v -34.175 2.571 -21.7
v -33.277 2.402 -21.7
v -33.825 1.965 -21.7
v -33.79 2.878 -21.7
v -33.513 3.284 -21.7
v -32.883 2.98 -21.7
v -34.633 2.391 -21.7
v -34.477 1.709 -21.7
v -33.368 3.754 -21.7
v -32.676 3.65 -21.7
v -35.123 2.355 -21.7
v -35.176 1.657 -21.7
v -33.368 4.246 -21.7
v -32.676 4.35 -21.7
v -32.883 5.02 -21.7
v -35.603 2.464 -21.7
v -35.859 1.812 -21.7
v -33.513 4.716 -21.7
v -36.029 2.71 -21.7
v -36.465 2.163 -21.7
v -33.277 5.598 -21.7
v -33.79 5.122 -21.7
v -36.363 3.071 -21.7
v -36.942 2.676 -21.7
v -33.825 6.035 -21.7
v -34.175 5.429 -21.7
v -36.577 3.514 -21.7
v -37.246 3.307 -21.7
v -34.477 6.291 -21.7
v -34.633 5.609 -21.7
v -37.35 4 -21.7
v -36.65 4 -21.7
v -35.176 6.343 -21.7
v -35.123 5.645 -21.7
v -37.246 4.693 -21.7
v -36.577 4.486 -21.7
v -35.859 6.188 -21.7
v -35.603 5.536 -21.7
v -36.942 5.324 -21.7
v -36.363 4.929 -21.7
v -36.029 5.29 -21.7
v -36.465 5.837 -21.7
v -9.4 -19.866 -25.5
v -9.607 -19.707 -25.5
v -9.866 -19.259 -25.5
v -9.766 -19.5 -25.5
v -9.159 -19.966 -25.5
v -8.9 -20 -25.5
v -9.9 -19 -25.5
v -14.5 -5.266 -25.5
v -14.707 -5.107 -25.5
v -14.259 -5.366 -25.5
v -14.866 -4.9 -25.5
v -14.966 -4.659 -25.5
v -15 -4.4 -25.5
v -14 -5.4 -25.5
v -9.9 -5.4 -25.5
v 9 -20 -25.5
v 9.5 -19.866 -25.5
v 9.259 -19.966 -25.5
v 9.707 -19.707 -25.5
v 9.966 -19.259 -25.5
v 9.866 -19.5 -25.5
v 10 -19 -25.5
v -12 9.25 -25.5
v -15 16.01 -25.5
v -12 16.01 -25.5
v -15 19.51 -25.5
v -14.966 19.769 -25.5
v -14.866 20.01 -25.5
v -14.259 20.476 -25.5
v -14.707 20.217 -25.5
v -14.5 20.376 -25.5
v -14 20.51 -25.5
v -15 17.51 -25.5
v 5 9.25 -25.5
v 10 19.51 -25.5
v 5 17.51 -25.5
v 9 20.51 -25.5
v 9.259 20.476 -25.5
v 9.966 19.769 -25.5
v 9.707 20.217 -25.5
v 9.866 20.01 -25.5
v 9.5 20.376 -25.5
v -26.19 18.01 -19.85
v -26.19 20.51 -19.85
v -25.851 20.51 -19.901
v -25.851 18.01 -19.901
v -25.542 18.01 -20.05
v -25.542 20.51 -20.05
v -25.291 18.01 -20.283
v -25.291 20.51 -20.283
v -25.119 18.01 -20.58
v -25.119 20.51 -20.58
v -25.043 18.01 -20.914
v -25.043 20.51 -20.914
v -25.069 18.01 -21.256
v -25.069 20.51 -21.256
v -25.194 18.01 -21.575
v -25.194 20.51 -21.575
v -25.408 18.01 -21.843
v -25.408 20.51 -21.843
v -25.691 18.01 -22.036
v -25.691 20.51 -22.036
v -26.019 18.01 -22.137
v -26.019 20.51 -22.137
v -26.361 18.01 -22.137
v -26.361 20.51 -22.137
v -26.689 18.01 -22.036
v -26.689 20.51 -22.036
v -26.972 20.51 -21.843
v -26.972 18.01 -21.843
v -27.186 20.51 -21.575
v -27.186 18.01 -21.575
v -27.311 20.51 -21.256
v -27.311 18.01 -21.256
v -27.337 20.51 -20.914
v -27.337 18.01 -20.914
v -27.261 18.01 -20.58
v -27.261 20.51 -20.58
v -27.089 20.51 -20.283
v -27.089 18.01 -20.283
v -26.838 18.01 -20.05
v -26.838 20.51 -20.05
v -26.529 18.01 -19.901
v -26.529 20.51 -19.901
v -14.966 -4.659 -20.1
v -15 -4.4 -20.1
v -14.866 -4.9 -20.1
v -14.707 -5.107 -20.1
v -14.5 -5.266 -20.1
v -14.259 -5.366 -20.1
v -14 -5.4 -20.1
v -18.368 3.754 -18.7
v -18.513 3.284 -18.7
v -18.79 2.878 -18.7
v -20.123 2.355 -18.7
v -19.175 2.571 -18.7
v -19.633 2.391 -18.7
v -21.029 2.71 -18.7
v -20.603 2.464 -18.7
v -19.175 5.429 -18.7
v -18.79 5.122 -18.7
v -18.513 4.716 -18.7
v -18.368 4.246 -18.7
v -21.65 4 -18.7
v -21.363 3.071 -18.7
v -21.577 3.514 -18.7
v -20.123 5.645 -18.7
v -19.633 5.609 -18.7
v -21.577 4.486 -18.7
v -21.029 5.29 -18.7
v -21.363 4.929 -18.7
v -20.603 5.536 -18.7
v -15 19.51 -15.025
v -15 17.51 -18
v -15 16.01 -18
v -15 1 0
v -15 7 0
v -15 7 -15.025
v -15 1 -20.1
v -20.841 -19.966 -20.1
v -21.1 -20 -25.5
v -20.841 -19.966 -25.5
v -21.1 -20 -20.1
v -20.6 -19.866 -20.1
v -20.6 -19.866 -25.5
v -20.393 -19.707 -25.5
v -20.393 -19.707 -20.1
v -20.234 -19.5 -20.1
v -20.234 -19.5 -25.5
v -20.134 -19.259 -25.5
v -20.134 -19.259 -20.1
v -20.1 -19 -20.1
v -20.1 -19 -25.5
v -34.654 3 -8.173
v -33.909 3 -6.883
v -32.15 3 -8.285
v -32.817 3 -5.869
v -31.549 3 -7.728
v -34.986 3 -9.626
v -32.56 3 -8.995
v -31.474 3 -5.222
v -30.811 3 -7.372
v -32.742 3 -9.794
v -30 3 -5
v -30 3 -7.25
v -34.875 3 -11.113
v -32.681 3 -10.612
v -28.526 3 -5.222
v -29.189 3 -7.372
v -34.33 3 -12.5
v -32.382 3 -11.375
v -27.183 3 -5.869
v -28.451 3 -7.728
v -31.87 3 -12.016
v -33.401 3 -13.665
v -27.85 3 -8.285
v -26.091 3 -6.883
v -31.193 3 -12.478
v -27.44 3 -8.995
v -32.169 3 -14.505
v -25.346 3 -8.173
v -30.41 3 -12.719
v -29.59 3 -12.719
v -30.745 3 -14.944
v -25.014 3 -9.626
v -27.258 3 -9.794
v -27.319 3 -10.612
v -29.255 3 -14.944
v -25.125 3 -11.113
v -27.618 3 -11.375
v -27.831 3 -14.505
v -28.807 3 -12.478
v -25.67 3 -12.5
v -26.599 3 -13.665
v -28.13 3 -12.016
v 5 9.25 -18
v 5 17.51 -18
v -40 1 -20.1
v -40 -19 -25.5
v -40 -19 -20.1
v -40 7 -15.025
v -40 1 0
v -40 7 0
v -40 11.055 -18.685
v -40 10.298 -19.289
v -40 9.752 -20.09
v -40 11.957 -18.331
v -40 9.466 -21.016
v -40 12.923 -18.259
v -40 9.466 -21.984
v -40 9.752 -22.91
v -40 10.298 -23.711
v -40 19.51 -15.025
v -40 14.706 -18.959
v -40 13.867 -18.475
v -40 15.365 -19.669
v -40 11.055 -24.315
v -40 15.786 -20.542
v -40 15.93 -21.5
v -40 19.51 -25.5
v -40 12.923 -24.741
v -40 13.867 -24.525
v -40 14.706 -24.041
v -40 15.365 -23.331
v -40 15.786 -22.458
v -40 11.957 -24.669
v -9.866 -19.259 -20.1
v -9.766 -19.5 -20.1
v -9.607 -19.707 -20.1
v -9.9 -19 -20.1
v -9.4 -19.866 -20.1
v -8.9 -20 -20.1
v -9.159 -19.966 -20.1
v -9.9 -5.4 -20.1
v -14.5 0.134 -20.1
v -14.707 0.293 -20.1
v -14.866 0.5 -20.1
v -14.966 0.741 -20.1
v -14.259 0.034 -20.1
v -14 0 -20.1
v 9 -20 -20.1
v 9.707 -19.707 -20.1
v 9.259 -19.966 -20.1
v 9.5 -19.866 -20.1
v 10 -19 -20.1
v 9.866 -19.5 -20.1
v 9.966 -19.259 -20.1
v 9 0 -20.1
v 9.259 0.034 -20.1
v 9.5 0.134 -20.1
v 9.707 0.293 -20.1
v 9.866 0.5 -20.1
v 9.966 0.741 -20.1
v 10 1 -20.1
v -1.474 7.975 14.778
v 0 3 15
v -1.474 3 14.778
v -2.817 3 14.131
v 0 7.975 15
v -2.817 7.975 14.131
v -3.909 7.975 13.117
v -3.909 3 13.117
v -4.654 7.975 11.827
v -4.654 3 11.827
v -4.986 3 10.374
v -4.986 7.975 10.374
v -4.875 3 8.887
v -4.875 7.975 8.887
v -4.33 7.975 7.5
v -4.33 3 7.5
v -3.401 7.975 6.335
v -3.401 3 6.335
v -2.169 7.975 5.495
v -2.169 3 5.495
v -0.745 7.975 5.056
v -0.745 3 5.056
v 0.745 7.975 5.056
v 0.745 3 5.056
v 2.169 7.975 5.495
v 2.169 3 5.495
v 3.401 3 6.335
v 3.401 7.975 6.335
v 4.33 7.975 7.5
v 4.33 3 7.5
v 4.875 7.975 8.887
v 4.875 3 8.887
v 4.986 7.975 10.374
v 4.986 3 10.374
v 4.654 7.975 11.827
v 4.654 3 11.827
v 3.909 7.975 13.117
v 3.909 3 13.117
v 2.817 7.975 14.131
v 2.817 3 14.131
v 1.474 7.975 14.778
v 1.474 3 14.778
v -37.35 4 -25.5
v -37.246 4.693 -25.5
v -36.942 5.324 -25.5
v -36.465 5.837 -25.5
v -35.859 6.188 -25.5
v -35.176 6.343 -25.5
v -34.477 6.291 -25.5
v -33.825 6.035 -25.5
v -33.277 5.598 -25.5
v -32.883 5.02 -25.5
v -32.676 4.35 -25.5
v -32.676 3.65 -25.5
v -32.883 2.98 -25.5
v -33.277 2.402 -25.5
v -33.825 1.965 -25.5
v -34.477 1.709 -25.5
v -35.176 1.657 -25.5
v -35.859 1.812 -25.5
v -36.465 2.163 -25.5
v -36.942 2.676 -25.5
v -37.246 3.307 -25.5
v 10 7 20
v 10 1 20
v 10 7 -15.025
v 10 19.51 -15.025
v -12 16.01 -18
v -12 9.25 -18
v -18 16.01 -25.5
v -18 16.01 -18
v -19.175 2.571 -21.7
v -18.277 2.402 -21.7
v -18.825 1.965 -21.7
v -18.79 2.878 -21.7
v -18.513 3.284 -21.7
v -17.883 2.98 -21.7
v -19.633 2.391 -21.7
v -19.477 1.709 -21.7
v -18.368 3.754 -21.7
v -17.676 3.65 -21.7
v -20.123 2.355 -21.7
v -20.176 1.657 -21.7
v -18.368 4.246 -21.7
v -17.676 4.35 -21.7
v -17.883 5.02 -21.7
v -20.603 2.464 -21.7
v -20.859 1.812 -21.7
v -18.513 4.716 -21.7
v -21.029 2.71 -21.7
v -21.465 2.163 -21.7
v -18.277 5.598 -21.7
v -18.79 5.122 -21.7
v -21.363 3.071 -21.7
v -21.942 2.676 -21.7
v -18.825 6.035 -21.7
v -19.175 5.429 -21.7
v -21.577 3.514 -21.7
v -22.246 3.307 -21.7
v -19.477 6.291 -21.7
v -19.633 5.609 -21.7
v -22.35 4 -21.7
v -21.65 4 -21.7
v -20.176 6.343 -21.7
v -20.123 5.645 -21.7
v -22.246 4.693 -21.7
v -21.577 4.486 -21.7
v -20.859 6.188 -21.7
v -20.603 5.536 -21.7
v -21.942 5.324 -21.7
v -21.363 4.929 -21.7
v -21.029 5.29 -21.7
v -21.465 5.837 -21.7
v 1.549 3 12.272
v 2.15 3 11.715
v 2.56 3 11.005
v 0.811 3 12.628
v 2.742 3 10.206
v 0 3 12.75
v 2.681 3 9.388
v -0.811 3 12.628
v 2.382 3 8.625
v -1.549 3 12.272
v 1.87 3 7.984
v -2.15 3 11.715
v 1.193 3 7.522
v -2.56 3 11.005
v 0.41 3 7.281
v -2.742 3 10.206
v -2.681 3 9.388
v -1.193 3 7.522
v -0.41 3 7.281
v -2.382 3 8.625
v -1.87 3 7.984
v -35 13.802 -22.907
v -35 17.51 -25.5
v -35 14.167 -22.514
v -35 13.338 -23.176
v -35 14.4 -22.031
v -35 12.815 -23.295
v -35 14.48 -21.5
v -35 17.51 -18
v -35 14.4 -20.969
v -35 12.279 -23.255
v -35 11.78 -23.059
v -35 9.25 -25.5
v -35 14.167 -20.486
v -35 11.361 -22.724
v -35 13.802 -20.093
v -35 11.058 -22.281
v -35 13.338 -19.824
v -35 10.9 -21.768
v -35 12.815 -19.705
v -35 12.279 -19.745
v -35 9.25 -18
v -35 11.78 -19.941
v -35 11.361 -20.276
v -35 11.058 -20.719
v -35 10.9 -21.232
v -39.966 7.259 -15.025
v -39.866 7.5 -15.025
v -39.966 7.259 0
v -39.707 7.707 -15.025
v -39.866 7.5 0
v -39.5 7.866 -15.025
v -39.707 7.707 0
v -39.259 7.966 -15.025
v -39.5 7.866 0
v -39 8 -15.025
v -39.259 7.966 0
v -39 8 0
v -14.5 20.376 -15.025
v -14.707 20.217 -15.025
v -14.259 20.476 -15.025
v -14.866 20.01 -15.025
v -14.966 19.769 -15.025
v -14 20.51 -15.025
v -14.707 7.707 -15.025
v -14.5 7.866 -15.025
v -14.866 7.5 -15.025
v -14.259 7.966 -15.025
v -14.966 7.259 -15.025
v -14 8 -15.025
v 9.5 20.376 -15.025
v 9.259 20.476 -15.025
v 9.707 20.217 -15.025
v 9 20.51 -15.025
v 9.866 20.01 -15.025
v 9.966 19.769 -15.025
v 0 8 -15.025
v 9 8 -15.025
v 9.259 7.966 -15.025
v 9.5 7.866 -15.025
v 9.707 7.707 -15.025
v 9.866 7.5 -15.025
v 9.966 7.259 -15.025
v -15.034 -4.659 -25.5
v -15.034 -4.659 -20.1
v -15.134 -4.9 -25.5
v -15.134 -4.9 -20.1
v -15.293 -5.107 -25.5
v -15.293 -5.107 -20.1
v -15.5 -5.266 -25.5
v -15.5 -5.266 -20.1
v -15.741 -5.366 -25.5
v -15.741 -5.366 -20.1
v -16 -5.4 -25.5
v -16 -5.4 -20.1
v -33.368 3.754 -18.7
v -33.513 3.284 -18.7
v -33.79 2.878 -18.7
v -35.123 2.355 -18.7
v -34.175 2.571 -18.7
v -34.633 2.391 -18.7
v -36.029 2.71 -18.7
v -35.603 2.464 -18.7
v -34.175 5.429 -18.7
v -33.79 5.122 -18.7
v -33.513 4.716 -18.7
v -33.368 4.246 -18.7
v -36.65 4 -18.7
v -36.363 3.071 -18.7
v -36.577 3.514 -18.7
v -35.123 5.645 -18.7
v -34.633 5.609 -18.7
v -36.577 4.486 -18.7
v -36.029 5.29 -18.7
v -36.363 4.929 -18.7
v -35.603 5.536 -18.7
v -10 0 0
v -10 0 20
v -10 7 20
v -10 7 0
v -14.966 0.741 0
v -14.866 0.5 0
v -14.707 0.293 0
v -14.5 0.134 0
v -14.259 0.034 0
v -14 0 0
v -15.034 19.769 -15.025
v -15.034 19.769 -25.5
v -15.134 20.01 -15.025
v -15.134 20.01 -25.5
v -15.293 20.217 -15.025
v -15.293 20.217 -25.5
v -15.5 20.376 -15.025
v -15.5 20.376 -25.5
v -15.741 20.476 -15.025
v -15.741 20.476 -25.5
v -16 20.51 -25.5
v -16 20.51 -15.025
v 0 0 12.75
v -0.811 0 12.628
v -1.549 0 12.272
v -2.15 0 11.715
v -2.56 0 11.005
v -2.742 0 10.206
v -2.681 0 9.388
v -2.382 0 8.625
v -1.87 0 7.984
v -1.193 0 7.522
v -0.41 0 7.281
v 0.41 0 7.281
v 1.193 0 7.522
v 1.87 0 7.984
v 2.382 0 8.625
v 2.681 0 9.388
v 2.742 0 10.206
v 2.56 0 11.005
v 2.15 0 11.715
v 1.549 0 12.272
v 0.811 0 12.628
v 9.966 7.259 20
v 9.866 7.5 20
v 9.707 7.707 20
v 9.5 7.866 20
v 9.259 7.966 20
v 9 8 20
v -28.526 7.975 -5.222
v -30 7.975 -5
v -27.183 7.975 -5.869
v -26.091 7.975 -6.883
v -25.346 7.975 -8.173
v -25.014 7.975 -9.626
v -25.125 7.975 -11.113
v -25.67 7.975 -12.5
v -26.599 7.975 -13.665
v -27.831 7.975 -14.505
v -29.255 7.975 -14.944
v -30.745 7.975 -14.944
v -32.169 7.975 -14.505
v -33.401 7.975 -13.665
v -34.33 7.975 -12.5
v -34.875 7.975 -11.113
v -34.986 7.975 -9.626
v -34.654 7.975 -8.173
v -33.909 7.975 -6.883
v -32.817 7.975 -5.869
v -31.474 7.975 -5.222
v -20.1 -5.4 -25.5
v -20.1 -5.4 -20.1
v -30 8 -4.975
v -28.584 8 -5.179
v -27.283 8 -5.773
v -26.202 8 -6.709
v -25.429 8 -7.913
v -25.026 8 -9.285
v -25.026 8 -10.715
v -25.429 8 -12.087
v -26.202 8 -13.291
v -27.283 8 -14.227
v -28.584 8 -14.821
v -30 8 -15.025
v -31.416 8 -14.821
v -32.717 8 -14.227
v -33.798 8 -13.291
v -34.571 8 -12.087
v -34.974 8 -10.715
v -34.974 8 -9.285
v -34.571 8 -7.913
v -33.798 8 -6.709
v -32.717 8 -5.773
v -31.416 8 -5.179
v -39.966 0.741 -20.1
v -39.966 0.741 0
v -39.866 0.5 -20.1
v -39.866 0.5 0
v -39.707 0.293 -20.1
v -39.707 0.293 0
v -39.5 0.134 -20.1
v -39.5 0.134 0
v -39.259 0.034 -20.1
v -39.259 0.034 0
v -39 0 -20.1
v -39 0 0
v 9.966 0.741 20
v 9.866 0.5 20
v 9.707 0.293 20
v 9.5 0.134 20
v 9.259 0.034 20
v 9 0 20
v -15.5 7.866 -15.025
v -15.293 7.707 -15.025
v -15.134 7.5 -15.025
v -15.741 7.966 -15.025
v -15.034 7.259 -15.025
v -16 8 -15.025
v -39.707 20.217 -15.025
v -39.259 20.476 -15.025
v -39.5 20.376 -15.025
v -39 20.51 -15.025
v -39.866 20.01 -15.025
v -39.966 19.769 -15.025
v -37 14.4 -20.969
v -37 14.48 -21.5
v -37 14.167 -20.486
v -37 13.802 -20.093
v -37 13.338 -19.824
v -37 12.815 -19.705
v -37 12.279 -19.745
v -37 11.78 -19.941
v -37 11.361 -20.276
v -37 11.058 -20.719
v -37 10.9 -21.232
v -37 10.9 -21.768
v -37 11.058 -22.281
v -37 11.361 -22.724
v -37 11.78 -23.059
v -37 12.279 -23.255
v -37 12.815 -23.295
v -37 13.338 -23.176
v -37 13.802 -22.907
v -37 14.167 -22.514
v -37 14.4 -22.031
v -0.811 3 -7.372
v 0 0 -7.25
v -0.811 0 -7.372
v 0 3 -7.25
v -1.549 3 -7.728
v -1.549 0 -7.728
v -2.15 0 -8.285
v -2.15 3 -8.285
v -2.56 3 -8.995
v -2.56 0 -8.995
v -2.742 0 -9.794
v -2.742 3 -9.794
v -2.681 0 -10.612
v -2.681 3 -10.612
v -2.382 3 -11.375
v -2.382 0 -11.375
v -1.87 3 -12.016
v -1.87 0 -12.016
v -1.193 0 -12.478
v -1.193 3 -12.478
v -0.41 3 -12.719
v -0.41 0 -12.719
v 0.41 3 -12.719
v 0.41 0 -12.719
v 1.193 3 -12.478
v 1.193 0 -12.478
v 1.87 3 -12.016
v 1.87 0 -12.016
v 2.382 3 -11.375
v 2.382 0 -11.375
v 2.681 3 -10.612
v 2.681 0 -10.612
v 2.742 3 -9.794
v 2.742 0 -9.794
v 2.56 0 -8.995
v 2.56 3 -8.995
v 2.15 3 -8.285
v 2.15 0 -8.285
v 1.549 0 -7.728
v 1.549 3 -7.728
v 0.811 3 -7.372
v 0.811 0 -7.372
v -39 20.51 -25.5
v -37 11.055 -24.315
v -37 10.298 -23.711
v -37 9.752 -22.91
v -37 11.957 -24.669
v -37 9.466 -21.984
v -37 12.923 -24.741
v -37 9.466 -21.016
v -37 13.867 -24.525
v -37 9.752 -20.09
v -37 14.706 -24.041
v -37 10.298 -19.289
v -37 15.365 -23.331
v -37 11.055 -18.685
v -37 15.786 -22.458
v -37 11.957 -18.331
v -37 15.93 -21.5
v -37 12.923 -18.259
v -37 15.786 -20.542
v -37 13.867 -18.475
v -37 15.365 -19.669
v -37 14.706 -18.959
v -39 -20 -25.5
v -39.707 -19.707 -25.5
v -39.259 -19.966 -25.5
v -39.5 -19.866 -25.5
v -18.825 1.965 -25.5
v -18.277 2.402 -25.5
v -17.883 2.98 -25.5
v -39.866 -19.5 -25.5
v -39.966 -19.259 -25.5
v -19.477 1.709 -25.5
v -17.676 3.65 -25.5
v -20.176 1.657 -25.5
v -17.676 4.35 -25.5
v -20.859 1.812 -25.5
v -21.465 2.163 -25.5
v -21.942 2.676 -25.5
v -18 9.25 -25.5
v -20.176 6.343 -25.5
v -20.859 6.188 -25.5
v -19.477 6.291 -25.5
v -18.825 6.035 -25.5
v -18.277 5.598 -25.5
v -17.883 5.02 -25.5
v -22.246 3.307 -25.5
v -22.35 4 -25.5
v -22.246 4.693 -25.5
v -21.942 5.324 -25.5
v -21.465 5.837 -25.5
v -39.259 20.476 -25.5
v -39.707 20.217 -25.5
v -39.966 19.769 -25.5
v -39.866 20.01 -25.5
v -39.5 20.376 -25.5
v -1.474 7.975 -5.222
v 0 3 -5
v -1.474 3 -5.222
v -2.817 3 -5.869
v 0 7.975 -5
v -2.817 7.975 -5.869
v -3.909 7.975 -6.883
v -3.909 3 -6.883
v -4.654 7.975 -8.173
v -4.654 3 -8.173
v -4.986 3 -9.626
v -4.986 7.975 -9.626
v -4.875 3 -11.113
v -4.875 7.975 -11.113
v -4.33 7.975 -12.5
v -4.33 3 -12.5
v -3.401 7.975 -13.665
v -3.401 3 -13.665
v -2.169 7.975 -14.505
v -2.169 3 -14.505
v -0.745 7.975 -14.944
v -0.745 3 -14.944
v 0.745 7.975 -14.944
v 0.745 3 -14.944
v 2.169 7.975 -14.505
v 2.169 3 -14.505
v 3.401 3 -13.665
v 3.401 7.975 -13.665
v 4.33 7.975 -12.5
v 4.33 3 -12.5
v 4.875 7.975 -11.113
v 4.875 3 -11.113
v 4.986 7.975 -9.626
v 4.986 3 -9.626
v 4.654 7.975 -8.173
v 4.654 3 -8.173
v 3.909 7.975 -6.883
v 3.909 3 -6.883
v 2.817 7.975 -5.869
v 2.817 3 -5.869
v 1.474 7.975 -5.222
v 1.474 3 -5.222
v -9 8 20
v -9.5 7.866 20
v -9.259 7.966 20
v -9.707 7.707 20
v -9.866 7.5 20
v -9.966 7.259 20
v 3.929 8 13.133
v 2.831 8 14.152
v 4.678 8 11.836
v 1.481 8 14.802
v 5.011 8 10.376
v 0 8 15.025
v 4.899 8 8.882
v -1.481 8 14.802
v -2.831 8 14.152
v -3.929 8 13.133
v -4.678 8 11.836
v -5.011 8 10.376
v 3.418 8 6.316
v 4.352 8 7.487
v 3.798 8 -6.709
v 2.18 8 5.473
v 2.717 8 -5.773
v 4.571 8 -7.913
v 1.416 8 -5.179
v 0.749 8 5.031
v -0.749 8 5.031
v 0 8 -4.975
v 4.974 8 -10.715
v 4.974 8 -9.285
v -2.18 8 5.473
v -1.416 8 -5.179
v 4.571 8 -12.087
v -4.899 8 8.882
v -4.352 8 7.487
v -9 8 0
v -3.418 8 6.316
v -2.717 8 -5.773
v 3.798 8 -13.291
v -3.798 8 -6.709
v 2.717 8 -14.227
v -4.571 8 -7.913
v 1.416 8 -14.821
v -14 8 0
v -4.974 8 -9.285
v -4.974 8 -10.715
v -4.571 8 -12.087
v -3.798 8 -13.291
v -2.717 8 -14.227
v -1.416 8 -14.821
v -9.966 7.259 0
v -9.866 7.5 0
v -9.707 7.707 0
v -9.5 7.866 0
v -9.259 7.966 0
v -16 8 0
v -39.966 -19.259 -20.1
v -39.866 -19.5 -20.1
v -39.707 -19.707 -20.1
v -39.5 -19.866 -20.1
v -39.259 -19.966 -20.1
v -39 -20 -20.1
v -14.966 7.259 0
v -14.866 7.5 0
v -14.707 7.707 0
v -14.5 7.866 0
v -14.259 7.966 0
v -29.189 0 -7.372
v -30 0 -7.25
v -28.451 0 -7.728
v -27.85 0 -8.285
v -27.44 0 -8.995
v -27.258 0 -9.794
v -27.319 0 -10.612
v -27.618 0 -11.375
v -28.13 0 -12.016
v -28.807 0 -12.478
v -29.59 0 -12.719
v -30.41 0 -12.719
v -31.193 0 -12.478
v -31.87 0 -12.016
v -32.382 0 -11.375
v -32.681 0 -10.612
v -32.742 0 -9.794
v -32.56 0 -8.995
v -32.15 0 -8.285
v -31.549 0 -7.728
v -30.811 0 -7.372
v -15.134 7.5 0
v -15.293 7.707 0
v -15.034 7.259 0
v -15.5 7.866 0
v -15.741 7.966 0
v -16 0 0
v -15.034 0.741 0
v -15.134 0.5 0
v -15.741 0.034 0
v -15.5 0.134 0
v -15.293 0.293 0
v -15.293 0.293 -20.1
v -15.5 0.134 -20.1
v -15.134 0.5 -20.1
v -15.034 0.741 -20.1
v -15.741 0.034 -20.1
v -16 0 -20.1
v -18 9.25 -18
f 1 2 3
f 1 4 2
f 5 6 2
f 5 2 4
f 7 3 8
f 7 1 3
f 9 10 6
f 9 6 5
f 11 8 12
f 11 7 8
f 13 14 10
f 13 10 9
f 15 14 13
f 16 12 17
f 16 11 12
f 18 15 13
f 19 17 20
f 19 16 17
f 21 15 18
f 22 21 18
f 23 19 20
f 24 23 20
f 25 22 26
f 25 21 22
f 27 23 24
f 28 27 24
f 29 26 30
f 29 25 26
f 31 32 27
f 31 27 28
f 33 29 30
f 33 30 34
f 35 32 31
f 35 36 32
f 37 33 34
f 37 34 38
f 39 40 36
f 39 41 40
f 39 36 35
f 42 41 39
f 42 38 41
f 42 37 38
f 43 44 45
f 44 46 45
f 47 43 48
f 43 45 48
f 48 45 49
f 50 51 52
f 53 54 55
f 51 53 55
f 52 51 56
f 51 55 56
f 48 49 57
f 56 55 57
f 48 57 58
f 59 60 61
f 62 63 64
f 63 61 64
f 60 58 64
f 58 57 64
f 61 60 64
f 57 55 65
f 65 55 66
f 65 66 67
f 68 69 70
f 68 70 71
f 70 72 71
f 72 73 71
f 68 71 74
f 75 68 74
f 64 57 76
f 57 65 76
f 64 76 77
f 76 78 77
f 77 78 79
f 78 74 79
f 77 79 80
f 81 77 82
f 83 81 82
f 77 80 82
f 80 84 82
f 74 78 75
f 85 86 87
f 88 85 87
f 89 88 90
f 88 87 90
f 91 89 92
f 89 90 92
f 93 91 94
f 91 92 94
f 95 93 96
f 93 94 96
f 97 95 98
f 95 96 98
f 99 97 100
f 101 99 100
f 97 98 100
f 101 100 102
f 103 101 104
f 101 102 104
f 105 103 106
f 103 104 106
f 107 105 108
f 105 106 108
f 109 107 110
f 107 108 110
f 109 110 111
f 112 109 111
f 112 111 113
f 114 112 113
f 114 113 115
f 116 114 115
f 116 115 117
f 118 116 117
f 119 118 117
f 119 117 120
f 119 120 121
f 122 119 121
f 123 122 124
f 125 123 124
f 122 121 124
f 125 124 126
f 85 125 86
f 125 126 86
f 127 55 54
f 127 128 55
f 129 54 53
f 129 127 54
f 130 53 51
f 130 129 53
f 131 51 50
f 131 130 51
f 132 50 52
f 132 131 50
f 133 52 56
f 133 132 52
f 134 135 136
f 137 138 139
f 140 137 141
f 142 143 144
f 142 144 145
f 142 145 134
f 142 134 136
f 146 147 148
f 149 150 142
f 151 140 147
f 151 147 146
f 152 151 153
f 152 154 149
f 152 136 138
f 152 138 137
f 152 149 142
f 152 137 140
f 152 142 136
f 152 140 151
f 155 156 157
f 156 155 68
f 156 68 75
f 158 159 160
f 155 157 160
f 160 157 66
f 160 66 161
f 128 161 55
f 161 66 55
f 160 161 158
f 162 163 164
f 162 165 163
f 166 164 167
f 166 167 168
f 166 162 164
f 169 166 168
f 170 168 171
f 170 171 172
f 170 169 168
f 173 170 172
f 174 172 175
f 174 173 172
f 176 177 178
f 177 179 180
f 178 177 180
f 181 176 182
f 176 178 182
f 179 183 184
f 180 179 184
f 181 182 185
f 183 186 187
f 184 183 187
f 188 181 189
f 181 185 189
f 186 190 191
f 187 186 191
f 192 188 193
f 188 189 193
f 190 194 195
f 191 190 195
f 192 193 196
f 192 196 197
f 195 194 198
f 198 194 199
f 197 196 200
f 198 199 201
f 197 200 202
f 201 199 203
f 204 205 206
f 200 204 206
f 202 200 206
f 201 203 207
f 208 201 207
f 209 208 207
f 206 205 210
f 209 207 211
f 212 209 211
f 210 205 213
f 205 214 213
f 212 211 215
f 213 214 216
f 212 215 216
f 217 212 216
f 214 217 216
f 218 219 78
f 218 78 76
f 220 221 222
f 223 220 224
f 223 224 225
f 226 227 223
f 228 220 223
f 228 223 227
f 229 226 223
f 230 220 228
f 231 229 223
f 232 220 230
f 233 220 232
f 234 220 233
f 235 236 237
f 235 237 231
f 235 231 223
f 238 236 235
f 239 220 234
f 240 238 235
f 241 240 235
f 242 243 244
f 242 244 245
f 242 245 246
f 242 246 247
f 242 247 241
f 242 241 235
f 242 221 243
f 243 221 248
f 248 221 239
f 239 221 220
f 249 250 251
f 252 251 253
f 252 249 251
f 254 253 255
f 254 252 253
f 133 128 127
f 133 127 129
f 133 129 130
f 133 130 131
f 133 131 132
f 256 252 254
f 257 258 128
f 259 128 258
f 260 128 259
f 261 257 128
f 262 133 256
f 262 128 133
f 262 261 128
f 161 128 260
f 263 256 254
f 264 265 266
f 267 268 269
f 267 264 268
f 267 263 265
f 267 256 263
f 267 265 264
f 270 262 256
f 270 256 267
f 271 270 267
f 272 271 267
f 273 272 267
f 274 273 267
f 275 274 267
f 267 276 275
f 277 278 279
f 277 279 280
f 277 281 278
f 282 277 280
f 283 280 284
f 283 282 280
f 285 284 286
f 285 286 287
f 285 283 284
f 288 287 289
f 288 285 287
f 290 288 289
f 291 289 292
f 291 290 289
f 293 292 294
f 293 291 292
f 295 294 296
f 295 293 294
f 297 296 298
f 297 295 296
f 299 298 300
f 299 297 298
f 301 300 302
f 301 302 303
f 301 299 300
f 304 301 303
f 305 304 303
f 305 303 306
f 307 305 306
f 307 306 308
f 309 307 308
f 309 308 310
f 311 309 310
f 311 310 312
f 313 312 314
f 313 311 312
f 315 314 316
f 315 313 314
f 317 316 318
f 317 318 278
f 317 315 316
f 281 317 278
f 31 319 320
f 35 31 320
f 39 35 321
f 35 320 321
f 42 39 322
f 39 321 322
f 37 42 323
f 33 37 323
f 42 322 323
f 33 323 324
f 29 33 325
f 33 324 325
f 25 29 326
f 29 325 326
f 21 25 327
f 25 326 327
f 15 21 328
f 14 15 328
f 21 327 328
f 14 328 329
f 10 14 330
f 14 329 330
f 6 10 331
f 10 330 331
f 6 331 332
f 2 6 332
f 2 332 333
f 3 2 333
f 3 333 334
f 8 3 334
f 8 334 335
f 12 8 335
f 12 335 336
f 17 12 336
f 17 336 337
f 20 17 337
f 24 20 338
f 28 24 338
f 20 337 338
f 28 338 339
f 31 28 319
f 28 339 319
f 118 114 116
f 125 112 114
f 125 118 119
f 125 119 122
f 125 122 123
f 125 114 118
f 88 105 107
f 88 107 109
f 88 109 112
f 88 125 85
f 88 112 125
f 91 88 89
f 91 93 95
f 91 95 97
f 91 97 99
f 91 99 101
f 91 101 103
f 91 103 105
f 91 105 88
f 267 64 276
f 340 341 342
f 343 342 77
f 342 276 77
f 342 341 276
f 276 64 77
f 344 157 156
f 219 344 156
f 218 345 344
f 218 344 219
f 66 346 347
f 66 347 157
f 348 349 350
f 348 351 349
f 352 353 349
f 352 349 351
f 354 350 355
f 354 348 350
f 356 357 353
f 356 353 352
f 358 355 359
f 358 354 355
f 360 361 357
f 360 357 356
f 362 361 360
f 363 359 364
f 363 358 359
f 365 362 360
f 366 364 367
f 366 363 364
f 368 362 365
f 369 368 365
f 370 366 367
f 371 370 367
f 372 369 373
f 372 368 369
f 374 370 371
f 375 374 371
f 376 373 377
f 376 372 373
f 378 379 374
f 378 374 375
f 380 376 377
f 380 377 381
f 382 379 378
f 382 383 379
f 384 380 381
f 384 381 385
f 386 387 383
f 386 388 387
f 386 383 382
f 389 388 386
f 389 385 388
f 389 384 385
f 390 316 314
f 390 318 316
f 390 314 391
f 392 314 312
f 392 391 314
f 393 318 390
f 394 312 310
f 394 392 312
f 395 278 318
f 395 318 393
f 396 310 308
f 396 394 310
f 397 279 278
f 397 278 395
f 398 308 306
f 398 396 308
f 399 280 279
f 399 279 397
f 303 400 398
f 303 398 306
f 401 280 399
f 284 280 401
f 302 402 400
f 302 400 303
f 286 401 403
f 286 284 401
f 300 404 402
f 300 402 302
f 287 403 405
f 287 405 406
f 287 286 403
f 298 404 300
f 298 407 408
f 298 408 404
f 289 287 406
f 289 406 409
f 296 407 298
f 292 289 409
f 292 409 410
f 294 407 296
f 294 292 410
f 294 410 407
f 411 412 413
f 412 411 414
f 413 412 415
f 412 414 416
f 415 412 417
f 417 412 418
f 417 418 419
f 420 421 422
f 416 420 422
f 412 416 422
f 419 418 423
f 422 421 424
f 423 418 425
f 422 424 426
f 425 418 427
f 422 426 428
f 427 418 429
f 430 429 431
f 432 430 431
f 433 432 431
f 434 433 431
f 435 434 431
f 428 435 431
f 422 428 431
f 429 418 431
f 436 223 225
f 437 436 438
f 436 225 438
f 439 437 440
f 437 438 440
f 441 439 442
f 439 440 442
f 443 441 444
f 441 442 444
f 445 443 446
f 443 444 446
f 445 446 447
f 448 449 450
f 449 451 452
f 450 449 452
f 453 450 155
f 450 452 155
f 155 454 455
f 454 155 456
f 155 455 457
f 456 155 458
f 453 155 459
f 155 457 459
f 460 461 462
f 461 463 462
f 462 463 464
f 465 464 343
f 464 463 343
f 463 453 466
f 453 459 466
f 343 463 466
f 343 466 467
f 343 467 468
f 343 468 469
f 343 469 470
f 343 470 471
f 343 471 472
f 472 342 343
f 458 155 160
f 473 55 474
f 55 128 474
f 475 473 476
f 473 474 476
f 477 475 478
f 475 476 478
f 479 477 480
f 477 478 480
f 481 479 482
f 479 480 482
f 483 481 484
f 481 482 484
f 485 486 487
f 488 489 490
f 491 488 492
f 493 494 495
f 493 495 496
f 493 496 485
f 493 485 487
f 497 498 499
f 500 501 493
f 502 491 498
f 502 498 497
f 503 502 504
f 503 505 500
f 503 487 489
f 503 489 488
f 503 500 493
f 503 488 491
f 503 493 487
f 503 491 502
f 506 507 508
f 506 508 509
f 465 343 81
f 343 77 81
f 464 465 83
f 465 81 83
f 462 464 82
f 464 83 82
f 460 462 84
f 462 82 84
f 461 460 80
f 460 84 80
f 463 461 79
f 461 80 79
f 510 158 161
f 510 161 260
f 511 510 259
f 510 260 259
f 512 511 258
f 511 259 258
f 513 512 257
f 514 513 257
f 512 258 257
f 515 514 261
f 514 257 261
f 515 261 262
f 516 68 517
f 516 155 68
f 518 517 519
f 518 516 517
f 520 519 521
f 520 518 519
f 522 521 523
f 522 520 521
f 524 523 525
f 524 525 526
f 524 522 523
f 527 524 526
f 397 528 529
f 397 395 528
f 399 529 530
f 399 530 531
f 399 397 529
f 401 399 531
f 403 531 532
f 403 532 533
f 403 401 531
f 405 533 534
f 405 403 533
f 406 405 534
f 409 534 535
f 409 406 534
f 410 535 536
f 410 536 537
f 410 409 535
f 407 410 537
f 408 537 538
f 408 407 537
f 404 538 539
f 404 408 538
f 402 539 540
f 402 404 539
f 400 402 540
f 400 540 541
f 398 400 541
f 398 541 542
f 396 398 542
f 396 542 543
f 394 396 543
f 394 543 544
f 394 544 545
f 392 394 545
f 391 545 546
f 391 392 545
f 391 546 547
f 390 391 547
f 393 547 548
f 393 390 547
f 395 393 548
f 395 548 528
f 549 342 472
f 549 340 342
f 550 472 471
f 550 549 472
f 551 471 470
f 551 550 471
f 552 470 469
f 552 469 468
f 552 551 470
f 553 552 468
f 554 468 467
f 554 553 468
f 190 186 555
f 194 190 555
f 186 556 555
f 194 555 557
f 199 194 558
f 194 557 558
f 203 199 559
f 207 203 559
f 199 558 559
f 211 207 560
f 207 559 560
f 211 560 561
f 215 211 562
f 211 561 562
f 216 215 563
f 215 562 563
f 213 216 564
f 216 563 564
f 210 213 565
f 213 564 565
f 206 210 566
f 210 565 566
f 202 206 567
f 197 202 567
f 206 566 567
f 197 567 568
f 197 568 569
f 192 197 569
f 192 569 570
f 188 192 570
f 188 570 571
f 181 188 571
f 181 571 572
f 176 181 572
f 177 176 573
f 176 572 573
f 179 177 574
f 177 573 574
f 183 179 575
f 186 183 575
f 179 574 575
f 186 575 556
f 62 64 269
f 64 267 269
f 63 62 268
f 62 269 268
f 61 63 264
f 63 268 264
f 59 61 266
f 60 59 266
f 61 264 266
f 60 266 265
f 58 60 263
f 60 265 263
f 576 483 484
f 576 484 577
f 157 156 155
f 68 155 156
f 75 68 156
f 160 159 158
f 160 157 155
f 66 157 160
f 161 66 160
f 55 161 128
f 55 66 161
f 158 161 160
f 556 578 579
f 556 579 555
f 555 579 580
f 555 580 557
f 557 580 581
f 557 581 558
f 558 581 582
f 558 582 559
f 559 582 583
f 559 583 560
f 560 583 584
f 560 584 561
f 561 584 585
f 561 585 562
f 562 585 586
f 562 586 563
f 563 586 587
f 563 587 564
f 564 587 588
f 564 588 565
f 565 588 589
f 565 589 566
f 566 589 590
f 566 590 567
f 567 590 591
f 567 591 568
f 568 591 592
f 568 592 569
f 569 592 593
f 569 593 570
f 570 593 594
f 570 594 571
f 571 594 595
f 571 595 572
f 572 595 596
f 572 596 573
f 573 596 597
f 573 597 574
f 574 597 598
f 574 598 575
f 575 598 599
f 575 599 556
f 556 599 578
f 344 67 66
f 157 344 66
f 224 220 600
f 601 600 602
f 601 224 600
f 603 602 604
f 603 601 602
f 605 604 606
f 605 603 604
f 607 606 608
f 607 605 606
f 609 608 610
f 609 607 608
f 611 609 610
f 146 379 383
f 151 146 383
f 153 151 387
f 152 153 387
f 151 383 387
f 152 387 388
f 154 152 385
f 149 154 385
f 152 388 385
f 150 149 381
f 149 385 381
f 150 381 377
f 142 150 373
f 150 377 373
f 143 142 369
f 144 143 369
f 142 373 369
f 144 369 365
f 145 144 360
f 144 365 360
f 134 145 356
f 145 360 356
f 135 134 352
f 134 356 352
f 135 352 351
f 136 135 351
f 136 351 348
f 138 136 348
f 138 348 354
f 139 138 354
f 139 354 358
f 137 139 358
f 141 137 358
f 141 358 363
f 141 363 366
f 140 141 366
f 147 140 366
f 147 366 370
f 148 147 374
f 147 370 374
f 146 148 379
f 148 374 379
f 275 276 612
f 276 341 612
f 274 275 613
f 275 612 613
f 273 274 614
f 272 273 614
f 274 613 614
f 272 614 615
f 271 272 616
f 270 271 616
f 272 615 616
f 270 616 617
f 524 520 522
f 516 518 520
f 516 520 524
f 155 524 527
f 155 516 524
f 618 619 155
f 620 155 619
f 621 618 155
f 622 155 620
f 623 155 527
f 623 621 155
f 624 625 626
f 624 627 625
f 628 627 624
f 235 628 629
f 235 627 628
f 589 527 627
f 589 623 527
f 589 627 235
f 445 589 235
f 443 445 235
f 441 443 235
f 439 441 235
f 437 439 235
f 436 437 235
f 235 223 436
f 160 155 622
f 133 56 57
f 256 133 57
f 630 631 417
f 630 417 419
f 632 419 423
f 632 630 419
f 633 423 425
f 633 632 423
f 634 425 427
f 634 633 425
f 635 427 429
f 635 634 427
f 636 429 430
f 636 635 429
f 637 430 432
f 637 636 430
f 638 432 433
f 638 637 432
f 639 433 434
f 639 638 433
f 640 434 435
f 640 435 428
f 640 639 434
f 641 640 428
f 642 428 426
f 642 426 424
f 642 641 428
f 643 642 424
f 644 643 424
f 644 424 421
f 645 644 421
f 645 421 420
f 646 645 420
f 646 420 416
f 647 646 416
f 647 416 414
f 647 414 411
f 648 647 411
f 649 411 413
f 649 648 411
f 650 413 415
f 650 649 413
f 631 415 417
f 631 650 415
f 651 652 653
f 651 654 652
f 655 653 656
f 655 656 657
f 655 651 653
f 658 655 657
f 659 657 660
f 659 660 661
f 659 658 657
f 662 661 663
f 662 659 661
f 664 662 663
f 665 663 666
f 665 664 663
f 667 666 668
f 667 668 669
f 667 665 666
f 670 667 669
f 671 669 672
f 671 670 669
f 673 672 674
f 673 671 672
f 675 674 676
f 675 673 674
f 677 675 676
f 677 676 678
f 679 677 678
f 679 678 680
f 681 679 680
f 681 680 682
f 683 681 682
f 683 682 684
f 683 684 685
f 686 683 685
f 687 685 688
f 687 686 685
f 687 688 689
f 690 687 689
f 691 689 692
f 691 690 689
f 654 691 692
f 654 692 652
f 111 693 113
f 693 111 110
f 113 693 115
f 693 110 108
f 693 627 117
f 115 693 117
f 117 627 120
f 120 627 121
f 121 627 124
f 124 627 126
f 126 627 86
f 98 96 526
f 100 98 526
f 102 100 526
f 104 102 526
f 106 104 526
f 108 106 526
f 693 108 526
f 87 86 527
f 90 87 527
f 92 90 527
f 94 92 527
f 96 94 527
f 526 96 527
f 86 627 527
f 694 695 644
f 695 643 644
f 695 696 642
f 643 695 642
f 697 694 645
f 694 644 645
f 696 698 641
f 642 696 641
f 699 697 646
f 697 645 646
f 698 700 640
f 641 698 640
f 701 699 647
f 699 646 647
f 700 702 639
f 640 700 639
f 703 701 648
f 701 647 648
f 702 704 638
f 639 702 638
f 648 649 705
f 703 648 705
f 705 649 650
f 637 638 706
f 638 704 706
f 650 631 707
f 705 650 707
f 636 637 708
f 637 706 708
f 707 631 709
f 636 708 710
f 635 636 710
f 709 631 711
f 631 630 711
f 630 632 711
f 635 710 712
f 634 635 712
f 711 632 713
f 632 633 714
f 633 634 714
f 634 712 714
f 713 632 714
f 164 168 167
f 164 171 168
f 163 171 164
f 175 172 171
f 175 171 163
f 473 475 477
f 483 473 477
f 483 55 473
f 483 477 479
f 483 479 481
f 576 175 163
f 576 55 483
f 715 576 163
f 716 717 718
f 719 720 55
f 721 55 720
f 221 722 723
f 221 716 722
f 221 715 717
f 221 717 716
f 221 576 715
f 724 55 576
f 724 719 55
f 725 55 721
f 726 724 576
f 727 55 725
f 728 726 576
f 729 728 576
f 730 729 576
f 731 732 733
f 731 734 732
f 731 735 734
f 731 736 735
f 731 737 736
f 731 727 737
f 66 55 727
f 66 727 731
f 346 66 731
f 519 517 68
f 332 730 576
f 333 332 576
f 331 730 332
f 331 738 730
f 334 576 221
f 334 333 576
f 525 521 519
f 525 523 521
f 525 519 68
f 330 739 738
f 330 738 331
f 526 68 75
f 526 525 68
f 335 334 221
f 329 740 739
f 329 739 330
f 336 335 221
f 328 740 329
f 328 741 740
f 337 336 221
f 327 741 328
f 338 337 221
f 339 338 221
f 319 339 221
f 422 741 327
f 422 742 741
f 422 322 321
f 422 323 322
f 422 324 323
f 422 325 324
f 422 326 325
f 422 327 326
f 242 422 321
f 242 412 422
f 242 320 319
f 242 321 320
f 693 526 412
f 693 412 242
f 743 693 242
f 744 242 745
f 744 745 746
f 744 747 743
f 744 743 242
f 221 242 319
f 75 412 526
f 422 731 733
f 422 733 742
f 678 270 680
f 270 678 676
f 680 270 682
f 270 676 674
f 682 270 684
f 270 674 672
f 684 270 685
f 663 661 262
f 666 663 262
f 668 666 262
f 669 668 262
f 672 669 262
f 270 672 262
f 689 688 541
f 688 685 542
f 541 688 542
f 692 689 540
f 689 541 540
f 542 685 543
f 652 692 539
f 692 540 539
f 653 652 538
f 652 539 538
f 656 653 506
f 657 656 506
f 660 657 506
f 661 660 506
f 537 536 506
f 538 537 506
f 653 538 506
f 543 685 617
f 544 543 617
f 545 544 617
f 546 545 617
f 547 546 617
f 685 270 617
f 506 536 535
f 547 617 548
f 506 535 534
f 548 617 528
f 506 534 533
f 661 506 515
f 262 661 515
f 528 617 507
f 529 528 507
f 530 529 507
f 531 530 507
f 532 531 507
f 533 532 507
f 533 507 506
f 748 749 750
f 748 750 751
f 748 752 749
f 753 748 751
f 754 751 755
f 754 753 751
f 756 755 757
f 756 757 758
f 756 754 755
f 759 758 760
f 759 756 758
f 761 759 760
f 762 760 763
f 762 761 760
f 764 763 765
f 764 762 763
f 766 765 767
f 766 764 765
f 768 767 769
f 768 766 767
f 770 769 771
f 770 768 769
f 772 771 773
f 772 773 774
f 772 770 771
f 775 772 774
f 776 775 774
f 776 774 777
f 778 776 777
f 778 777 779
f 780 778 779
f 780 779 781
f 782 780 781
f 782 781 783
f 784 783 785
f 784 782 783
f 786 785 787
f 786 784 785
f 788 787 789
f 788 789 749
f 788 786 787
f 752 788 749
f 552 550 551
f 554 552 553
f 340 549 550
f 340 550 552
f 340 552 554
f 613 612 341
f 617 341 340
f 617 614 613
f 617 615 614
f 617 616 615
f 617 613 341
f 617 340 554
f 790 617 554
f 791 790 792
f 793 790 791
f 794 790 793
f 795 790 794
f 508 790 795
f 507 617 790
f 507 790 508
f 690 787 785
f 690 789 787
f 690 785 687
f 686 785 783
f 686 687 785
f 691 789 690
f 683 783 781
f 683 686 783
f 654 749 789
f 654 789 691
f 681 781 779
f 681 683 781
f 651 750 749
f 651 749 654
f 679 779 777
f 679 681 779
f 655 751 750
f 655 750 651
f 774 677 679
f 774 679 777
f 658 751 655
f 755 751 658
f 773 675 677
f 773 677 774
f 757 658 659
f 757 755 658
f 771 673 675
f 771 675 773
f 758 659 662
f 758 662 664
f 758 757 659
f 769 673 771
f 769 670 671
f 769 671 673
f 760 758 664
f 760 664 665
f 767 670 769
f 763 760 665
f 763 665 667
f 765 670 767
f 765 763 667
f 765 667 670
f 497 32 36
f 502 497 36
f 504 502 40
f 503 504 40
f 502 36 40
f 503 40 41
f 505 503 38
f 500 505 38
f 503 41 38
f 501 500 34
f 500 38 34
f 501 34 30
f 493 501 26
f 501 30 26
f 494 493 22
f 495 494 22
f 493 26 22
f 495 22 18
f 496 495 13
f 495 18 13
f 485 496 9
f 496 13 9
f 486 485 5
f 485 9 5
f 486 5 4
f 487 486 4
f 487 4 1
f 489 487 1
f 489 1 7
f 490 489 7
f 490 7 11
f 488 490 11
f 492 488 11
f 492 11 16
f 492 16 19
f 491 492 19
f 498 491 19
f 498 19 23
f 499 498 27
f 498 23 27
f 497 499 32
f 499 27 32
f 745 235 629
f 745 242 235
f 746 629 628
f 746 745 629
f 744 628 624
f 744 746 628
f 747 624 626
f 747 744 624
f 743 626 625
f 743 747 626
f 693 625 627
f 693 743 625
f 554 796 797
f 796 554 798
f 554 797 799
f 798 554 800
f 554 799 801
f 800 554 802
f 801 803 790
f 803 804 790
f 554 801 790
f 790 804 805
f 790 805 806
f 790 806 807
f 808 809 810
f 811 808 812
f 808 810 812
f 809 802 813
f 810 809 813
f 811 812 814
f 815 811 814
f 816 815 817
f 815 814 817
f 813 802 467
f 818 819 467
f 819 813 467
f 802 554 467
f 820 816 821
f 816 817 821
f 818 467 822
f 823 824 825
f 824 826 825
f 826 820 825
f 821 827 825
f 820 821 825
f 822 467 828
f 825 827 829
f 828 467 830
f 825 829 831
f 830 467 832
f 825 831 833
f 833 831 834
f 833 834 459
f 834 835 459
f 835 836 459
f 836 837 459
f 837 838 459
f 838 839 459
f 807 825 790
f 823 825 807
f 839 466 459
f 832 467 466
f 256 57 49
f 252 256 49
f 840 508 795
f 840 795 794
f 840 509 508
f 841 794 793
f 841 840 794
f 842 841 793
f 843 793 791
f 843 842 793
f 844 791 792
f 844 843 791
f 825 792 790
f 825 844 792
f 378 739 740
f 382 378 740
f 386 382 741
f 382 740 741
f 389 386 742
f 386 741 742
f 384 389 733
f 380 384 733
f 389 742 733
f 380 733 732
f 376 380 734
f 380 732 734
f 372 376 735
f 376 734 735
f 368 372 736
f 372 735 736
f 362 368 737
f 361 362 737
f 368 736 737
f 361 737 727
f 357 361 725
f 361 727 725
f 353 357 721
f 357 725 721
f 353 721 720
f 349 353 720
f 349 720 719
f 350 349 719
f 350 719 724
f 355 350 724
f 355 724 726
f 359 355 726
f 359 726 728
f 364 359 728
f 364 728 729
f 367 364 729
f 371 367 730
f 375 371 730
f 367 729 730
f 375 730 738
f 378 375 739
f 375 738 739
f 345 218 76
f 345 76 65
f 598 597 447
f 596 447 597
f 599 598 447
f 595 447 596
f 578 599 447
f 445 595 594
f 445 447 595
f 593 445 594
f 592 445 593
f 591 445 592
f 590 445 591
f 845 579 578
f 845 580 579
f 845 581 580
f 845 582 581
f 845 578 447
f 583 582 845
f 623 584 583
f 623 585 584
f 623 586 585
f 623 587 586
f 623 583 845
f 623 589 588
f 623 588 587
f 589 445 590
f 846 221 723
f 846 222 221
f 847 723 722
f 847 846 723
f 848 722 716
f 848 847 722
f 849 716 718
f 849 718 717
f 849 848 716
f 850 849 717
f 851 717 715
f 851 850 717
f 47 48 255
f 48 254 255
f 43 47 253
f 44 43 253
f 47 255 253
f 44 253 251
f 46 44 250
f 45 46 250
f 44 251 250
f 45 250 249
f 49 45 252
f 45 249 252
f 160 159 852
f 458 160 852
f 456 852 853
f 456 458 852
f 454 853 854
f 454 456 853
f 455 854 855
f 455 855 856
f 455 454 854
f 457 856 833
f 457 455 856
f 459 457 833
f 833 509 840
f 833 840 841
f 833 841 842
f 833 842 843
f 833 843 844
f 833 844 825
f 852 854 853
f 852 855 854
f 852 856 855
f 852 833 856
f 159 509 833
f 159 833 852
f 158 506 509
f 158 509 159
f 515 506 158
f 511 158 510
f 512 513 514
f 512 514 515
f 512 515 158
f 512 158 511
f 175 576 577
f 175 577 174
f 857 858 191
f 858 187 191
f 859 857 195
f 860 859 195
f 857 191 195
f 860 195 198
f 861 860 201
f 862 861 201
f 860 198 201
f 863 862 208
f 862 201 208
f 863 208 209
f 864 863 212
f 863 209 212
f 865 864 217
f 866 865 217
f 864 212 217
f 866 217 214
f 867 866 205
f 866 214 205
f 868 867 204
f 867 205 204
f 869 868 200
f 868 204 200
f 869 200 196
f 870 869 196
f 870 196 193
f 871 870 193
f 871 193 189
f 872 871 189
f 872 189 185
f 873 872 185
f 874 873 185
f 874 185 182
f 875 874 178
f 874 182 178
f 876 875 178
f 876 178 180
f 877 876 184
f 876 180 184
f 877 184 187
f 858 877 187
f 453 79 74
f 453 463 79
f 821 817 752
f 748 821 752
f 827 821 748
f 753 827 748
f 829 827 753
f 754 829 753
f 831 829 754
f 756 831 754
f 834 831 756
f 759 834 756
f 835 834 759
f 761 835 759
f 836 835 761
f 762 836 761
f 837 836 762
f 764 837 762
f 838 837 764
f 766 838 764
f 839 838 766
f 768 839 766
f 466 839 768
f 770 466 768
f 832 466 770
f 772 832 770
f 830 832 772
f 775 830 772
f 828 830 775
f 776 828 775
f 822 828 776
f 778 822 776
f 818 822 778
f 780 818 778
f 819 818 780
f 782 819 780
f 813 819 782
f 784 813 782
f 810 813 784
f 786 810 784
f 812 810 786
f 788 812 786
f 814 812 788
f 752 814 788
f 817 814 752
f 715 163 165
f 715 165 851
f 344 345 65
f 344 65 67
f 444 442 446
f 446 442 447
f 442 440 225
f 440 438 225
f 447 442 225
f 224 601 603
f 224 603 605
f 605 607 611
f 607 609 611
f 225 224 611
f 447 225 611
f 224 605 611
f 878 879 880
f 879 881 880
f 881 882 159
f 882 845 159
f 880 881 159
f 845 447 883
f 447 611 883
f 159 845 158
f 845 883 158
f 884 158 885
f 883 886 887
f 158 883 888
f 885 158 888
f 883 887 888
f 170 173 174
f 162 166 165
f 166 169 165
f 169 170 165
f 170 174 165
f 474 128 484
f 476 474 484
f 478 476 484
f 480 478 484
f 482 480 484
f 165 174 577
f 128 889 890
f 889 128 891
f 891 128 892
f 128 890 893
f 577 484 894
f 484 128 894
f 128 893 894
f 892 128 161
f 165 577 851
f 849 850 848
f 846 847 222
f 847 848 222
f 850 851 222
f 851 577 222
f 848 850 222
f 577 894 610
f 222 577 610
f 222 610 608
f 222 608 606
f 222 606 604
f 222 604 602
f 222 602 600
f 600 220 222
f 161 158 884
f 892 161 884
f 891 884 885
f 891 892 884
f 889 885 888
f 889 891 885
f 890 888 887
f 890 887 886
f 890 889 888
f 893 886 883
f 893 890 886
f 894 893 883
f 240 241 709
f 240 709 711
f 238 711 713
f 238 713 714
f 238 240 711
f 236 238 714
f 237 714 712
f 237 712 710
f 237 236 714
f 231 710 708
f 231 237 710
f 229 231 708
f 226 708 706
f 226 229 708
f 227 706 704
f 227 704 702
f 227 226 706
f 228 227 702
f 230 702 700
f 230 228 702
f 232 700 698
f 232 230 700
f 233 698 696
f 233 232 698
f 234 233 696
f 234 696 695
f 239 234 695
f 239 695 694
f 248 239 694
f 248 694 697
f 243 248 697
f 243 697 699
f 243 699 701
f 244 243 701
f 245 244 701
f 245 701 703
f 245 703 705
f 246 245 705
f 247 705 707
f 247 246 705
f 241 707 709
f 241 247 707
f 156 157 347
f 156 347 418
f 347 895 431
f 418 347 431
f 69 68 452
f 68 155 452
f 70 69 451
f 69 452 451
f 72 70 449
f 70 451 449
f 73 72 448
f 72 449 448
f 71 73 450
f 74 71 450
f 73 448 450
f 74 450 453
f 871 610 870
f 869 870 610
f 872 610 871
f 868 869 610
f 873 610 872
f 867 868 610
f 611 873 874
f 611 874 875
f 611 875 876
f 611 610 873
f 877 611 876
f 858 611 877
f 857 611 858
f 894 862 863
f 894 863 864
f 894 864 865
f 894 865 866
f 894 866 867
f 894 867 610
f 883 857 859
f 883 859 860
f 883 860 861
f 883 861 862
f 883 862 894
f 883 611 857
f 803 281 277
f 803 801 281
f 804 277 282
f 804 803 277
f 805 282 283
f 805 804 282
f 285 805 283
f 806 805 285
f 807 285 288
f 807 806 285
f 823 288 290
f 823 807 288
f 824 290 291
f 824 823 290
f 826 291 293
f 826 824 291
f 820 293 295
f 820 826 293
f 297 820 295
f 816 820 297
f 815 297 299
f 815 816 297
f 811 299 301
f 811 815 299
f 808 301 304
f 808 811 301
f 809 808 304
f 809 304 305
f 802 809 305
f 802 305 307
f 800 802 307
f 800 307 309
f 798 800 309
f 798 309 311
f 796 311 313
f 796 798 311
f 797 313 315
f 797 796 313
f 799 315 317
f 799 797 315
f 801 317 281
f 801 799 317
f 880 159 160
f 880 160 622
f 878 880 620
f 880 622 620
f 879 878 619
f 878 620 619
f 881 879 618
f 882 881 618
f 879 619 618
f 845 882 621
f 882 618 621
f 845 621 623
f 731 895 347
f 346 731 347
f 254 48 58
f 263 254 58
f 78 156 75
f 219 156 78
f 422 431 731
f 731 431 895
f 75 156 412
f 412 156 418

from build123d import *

# Parameters (mm, degrees)
BOSS_EXTRUDE1_DEPTH            = 8
CBORE_FOR_M5_SHCS1_AT_2_COUNT  = 2
CBORE_FOR_M5_SHCS1_AT_2_PITCH  = 20
SKETCH5_W                      = 25
SKETCH5_H                      = 2.975
BOSS_EXTRUDE2_DEPTH            = 12.51
SKETCH6_W                      = 3
SKETCH6_H                      = 8.01
BOSS_EXTRUDE3_DEPTH            = 7.5
BOSS_EXTRUDE4_DEPTH            = 5.5
SKETCH8_W                      = 17
SKETCH8_H                      = 1.25
BOSS_EXTRUDE5_DEPTH            = 7.5
BOSS_EXTRUDE6_DEPTH            = 5.4
FILLET2_R                      = 1
CBORE_START                    = -40
CBORE_FOR_M3_SHCS1_OUTLINE_R   = 3.25
CBORE_FOR_M3_SHCS1_DEPTH       = 3
CBORE_START_2                  = -37
CBORE_FOR_M3_SHCS1_2_OUTLINE_R = 1.8
CBORE_FOR_M3_SHCS1_2_DEPTH     = 2
SKETCH13_R                     = 2.35
CUT_EXTRUDE1_DEPTH             = 3.8
SKETCH14_R                     = 1.65
CUT_EXTRUDE2_DEPTH             = 3
SKETCH15_W                     = 20
SKETCH15_H                     = 20
CUT_EXTRUDE3_DEPTH             = 52.680848484
SKETCH16_R                     = 1.15
CUT_EXTRUDE4_DEPTH             = 2.5


# Read off the part's stored shape, not the designer's step: CBORE for M3 SHCS1
with BuildPart() as part:
    # Sketch1 → Boss-Extrude1 (new body)
    with BuildSketch(Plane(origin=(0, 0, 0), x_dir=(1, 0, 0), z_dir=(0, 1, 0))):
        Polygon((-10, 0), (-15, 0), (-15, 20), (-10, 20), (10, 20), (10, -20), (-10, -20), align=None)
    extrude(amount=BOSS_EXTRUDE1_DEPTH)

    # Sketch4 → CBORE for M5 SHCS1 (revolve, cut)
    with BuildSketch(Plane(origin=(0, 8, -10), x_dir=(0, 0, 1), z_dir=(1, 0, 0))):
        Polygon((0, 0), (0, 8), (2.75, 8), (2.75, 5), (5, 5), (5, 0.025), (5.025, 0), align=None)
    cbore_for_m5_shcs1 = revolve(axis=Axis((0, 14.35, -10), (0, -1, 0)), mode=Mode.SUBTRACT)

    # CBORE for M5 SHCS1 at 2: CBORE for M5 SHCS1 ×2
    with Locations(*[(0, 0, i * CBORE_FOR_M5_SHCS1_AT_2_PITCH) for i in range(1, CBORE_FOR_M5_SHCS1_AT_2_COUNT)]):
        add(cbore_for_m5_shcs1, mode=Mode.SUBTRACT)

    # Sketch5 → Boss-Extrude2 (add)
    with BuildSketch(Plane(origin=(0, 8, 0), x_dir=(1, 0, 0), z_dir=(0, 1, 0))):
        with Locations((-2.5, 16.5125)):
            Rectangle(SKETCH5_W, SKETCH5_H)
    extrude(amount=BOSS_EXTRUDE2_DEPTH)

    # Sketch6 → Boss-Extrude3 (add)
    with BuildSketch(Plane(origin=(0, 0, -18), x_dir=(-1, 0, 0), z_dir=(0, 0, -1))):
        Polygon((-10, 20.51), (15, 20.51), (15, 17.51), (-5, 17.51), (-5, 8), (-10, 8), (-10, 20), align=None)
        with Locations((13.5, 12.005)):
            Rectangle(SKETCH6_W, SKETCH6_H)
    extrude(amount=BOSS_EXTRUDE3_DEPTH)

    # Sketch7 → Boss-Extrude4 (add)
    with BuildSketch(Plane(origin=(0, 0, -20), x_dir=(-1, 0, 0), z_dir=(0, 0, -1))):
        Polygon((-10, 0), (15, 0), (15, 8), (12, 8), (-5, 8), (-10, 8), align=None)
    extrude(amount=BOSS_EXTRUDE4_DEPTH)

    # Sketch8 → Boss-Extrude5 (add)
    with BuildSketch(Plane(origin=(0, 0, -18), x_dir=(-1, 0, 0), z_dir=(0, 0, -1))):
        with Locations((3.5, 8.625)):
            Rectangle(SKETCH8_W, SKETCH8_H)
    extrude(amount=BOSS_EXTRUDE5_DEPTH)

    # Sketch9 → Boss-Extrude6 (add)
    with BuildSketch(Plane(origin=(0, 0, -25.5), x_dir=(-1, 0, 0), z_dir=(0, 0, -1))):
        Polygon((-10, 0), (15, 0), (15, -5.4), (9.9, -5.4), (9.9, -20), (-10, -20), align=None)
    extrude(amount=-BOSS_EXTRUDE6_DEPTH)

    # Fillet2
    fillet2_edges = [part.edges().sort_by_distance(p)[0] for p in [
        (10, 0, -0.05),
        (-15, 0, -10.05),
        (10, -20, -22.8),
        (-15, -5.4, -22.8),
        (-9.9, -20, -22.8),
        (-10, 8, 10),
        (-15, 8, -7.5125),
        (-15, 20.51, -20.2625),
        (10, 20.51, -20.2625),
        (10, 8, 2.4875),
    ]]
    fillet(fillet2_edges, radius=FILLET2_R)


with BuildPart() as body_2:
    # Mirror1: mirrored copy
    add(part.part.mirror(Plane(origin=(-15, 8, 0), x_dir=(0, 0, 1), z_dir=(1, 0, 0))))

    # CBORE for M3 SHCS1 outline → CBORE for M3 SHCS1 (cut)
    with BuildSketch(Plane.YZ.offset(CBORE_START)):
        with Locations((12.68, -21.5)):
            Circle(CBORE_FOR_M3_SHCS1_OUTLINE_R)
    extrude(amount=CBORE_FOR_M3_SHCS1_DEPTH, mode=Mode.SUBTRACT)

    # CBORE for M3 SHCS1 2 outline → CBORE for M3 SHCS1 2 (cut)
    with BuildSketch(Plane.YZ.offset(CBORE_START_2)):
        with Locations((12.68, -21.5)):
            Circle(CBORE_FOR_M3_SHCS1_2_OUTLINE_R)
    extrude(amount=CBORE_FOR_M3_SHCS1_2_DEPTH, mode=Mode.SUBTRACT)

    # Sketch13 → Cut-Extrude1 (cut)
    with BuildSketch(Plane(origin=(0, 0, -25.5), x_dir=(-1, 0, 0), z_dir=(0, 0, -1))):
        with Locations((20, 4)):
            Circle(SKETCH13_R)
        with Locations((35, 4)):
            Circle(SKETCH13_R)
    extrude(amount=-CUT_EXTRUDE1_DEPTH, mode=Mode.SUBTRACT)

    # Sketch14 → Cut-Extrude2 (cut)
    with BuildSketch(Plane(origin=(0, 0, -21.7), x_dir=(-1, 0, 0), z_dir=(0, 0, -1))):
        with Locations((35, 4)):
            Circle(SKETCH14_R)
        with Locations((20, 4)):
            Circle(SKETCH14_R)
    extrude(amount=-CUT_EXTRUDE2_DEPTH, mode=Mode.SUBTRACT)

    # Sketch15 → Cut-Extrude3 (cut, through all)
    with BuildSketch(Plane.XZ):
        with Locations((-30, 10)):
            Rectangle(SKETCH15_W, SKETCH15_H)
    extrude(amount=-CUT_EXTRUDE3_DEPTH, mode=Mode.SUBTRACT)

    # Sketch16 → Cut-Extrude4 (cut, symmetric)
    with BuildSketch(Plane(origin=(0, 20.51, 0), x_dir=(1, 0, 0), z_dir=(0, 1, 0))):
        with Locations(Location((-26.19, 21, 0), (0, 0, 270))):
            Circle(SKETCH16_R)
    extrude(amount=CUT_EXTRUDE4_DEPTH, both=True, mode=Mode.SUBTRACT)


solid = Compound([part.part, body_2.part])
